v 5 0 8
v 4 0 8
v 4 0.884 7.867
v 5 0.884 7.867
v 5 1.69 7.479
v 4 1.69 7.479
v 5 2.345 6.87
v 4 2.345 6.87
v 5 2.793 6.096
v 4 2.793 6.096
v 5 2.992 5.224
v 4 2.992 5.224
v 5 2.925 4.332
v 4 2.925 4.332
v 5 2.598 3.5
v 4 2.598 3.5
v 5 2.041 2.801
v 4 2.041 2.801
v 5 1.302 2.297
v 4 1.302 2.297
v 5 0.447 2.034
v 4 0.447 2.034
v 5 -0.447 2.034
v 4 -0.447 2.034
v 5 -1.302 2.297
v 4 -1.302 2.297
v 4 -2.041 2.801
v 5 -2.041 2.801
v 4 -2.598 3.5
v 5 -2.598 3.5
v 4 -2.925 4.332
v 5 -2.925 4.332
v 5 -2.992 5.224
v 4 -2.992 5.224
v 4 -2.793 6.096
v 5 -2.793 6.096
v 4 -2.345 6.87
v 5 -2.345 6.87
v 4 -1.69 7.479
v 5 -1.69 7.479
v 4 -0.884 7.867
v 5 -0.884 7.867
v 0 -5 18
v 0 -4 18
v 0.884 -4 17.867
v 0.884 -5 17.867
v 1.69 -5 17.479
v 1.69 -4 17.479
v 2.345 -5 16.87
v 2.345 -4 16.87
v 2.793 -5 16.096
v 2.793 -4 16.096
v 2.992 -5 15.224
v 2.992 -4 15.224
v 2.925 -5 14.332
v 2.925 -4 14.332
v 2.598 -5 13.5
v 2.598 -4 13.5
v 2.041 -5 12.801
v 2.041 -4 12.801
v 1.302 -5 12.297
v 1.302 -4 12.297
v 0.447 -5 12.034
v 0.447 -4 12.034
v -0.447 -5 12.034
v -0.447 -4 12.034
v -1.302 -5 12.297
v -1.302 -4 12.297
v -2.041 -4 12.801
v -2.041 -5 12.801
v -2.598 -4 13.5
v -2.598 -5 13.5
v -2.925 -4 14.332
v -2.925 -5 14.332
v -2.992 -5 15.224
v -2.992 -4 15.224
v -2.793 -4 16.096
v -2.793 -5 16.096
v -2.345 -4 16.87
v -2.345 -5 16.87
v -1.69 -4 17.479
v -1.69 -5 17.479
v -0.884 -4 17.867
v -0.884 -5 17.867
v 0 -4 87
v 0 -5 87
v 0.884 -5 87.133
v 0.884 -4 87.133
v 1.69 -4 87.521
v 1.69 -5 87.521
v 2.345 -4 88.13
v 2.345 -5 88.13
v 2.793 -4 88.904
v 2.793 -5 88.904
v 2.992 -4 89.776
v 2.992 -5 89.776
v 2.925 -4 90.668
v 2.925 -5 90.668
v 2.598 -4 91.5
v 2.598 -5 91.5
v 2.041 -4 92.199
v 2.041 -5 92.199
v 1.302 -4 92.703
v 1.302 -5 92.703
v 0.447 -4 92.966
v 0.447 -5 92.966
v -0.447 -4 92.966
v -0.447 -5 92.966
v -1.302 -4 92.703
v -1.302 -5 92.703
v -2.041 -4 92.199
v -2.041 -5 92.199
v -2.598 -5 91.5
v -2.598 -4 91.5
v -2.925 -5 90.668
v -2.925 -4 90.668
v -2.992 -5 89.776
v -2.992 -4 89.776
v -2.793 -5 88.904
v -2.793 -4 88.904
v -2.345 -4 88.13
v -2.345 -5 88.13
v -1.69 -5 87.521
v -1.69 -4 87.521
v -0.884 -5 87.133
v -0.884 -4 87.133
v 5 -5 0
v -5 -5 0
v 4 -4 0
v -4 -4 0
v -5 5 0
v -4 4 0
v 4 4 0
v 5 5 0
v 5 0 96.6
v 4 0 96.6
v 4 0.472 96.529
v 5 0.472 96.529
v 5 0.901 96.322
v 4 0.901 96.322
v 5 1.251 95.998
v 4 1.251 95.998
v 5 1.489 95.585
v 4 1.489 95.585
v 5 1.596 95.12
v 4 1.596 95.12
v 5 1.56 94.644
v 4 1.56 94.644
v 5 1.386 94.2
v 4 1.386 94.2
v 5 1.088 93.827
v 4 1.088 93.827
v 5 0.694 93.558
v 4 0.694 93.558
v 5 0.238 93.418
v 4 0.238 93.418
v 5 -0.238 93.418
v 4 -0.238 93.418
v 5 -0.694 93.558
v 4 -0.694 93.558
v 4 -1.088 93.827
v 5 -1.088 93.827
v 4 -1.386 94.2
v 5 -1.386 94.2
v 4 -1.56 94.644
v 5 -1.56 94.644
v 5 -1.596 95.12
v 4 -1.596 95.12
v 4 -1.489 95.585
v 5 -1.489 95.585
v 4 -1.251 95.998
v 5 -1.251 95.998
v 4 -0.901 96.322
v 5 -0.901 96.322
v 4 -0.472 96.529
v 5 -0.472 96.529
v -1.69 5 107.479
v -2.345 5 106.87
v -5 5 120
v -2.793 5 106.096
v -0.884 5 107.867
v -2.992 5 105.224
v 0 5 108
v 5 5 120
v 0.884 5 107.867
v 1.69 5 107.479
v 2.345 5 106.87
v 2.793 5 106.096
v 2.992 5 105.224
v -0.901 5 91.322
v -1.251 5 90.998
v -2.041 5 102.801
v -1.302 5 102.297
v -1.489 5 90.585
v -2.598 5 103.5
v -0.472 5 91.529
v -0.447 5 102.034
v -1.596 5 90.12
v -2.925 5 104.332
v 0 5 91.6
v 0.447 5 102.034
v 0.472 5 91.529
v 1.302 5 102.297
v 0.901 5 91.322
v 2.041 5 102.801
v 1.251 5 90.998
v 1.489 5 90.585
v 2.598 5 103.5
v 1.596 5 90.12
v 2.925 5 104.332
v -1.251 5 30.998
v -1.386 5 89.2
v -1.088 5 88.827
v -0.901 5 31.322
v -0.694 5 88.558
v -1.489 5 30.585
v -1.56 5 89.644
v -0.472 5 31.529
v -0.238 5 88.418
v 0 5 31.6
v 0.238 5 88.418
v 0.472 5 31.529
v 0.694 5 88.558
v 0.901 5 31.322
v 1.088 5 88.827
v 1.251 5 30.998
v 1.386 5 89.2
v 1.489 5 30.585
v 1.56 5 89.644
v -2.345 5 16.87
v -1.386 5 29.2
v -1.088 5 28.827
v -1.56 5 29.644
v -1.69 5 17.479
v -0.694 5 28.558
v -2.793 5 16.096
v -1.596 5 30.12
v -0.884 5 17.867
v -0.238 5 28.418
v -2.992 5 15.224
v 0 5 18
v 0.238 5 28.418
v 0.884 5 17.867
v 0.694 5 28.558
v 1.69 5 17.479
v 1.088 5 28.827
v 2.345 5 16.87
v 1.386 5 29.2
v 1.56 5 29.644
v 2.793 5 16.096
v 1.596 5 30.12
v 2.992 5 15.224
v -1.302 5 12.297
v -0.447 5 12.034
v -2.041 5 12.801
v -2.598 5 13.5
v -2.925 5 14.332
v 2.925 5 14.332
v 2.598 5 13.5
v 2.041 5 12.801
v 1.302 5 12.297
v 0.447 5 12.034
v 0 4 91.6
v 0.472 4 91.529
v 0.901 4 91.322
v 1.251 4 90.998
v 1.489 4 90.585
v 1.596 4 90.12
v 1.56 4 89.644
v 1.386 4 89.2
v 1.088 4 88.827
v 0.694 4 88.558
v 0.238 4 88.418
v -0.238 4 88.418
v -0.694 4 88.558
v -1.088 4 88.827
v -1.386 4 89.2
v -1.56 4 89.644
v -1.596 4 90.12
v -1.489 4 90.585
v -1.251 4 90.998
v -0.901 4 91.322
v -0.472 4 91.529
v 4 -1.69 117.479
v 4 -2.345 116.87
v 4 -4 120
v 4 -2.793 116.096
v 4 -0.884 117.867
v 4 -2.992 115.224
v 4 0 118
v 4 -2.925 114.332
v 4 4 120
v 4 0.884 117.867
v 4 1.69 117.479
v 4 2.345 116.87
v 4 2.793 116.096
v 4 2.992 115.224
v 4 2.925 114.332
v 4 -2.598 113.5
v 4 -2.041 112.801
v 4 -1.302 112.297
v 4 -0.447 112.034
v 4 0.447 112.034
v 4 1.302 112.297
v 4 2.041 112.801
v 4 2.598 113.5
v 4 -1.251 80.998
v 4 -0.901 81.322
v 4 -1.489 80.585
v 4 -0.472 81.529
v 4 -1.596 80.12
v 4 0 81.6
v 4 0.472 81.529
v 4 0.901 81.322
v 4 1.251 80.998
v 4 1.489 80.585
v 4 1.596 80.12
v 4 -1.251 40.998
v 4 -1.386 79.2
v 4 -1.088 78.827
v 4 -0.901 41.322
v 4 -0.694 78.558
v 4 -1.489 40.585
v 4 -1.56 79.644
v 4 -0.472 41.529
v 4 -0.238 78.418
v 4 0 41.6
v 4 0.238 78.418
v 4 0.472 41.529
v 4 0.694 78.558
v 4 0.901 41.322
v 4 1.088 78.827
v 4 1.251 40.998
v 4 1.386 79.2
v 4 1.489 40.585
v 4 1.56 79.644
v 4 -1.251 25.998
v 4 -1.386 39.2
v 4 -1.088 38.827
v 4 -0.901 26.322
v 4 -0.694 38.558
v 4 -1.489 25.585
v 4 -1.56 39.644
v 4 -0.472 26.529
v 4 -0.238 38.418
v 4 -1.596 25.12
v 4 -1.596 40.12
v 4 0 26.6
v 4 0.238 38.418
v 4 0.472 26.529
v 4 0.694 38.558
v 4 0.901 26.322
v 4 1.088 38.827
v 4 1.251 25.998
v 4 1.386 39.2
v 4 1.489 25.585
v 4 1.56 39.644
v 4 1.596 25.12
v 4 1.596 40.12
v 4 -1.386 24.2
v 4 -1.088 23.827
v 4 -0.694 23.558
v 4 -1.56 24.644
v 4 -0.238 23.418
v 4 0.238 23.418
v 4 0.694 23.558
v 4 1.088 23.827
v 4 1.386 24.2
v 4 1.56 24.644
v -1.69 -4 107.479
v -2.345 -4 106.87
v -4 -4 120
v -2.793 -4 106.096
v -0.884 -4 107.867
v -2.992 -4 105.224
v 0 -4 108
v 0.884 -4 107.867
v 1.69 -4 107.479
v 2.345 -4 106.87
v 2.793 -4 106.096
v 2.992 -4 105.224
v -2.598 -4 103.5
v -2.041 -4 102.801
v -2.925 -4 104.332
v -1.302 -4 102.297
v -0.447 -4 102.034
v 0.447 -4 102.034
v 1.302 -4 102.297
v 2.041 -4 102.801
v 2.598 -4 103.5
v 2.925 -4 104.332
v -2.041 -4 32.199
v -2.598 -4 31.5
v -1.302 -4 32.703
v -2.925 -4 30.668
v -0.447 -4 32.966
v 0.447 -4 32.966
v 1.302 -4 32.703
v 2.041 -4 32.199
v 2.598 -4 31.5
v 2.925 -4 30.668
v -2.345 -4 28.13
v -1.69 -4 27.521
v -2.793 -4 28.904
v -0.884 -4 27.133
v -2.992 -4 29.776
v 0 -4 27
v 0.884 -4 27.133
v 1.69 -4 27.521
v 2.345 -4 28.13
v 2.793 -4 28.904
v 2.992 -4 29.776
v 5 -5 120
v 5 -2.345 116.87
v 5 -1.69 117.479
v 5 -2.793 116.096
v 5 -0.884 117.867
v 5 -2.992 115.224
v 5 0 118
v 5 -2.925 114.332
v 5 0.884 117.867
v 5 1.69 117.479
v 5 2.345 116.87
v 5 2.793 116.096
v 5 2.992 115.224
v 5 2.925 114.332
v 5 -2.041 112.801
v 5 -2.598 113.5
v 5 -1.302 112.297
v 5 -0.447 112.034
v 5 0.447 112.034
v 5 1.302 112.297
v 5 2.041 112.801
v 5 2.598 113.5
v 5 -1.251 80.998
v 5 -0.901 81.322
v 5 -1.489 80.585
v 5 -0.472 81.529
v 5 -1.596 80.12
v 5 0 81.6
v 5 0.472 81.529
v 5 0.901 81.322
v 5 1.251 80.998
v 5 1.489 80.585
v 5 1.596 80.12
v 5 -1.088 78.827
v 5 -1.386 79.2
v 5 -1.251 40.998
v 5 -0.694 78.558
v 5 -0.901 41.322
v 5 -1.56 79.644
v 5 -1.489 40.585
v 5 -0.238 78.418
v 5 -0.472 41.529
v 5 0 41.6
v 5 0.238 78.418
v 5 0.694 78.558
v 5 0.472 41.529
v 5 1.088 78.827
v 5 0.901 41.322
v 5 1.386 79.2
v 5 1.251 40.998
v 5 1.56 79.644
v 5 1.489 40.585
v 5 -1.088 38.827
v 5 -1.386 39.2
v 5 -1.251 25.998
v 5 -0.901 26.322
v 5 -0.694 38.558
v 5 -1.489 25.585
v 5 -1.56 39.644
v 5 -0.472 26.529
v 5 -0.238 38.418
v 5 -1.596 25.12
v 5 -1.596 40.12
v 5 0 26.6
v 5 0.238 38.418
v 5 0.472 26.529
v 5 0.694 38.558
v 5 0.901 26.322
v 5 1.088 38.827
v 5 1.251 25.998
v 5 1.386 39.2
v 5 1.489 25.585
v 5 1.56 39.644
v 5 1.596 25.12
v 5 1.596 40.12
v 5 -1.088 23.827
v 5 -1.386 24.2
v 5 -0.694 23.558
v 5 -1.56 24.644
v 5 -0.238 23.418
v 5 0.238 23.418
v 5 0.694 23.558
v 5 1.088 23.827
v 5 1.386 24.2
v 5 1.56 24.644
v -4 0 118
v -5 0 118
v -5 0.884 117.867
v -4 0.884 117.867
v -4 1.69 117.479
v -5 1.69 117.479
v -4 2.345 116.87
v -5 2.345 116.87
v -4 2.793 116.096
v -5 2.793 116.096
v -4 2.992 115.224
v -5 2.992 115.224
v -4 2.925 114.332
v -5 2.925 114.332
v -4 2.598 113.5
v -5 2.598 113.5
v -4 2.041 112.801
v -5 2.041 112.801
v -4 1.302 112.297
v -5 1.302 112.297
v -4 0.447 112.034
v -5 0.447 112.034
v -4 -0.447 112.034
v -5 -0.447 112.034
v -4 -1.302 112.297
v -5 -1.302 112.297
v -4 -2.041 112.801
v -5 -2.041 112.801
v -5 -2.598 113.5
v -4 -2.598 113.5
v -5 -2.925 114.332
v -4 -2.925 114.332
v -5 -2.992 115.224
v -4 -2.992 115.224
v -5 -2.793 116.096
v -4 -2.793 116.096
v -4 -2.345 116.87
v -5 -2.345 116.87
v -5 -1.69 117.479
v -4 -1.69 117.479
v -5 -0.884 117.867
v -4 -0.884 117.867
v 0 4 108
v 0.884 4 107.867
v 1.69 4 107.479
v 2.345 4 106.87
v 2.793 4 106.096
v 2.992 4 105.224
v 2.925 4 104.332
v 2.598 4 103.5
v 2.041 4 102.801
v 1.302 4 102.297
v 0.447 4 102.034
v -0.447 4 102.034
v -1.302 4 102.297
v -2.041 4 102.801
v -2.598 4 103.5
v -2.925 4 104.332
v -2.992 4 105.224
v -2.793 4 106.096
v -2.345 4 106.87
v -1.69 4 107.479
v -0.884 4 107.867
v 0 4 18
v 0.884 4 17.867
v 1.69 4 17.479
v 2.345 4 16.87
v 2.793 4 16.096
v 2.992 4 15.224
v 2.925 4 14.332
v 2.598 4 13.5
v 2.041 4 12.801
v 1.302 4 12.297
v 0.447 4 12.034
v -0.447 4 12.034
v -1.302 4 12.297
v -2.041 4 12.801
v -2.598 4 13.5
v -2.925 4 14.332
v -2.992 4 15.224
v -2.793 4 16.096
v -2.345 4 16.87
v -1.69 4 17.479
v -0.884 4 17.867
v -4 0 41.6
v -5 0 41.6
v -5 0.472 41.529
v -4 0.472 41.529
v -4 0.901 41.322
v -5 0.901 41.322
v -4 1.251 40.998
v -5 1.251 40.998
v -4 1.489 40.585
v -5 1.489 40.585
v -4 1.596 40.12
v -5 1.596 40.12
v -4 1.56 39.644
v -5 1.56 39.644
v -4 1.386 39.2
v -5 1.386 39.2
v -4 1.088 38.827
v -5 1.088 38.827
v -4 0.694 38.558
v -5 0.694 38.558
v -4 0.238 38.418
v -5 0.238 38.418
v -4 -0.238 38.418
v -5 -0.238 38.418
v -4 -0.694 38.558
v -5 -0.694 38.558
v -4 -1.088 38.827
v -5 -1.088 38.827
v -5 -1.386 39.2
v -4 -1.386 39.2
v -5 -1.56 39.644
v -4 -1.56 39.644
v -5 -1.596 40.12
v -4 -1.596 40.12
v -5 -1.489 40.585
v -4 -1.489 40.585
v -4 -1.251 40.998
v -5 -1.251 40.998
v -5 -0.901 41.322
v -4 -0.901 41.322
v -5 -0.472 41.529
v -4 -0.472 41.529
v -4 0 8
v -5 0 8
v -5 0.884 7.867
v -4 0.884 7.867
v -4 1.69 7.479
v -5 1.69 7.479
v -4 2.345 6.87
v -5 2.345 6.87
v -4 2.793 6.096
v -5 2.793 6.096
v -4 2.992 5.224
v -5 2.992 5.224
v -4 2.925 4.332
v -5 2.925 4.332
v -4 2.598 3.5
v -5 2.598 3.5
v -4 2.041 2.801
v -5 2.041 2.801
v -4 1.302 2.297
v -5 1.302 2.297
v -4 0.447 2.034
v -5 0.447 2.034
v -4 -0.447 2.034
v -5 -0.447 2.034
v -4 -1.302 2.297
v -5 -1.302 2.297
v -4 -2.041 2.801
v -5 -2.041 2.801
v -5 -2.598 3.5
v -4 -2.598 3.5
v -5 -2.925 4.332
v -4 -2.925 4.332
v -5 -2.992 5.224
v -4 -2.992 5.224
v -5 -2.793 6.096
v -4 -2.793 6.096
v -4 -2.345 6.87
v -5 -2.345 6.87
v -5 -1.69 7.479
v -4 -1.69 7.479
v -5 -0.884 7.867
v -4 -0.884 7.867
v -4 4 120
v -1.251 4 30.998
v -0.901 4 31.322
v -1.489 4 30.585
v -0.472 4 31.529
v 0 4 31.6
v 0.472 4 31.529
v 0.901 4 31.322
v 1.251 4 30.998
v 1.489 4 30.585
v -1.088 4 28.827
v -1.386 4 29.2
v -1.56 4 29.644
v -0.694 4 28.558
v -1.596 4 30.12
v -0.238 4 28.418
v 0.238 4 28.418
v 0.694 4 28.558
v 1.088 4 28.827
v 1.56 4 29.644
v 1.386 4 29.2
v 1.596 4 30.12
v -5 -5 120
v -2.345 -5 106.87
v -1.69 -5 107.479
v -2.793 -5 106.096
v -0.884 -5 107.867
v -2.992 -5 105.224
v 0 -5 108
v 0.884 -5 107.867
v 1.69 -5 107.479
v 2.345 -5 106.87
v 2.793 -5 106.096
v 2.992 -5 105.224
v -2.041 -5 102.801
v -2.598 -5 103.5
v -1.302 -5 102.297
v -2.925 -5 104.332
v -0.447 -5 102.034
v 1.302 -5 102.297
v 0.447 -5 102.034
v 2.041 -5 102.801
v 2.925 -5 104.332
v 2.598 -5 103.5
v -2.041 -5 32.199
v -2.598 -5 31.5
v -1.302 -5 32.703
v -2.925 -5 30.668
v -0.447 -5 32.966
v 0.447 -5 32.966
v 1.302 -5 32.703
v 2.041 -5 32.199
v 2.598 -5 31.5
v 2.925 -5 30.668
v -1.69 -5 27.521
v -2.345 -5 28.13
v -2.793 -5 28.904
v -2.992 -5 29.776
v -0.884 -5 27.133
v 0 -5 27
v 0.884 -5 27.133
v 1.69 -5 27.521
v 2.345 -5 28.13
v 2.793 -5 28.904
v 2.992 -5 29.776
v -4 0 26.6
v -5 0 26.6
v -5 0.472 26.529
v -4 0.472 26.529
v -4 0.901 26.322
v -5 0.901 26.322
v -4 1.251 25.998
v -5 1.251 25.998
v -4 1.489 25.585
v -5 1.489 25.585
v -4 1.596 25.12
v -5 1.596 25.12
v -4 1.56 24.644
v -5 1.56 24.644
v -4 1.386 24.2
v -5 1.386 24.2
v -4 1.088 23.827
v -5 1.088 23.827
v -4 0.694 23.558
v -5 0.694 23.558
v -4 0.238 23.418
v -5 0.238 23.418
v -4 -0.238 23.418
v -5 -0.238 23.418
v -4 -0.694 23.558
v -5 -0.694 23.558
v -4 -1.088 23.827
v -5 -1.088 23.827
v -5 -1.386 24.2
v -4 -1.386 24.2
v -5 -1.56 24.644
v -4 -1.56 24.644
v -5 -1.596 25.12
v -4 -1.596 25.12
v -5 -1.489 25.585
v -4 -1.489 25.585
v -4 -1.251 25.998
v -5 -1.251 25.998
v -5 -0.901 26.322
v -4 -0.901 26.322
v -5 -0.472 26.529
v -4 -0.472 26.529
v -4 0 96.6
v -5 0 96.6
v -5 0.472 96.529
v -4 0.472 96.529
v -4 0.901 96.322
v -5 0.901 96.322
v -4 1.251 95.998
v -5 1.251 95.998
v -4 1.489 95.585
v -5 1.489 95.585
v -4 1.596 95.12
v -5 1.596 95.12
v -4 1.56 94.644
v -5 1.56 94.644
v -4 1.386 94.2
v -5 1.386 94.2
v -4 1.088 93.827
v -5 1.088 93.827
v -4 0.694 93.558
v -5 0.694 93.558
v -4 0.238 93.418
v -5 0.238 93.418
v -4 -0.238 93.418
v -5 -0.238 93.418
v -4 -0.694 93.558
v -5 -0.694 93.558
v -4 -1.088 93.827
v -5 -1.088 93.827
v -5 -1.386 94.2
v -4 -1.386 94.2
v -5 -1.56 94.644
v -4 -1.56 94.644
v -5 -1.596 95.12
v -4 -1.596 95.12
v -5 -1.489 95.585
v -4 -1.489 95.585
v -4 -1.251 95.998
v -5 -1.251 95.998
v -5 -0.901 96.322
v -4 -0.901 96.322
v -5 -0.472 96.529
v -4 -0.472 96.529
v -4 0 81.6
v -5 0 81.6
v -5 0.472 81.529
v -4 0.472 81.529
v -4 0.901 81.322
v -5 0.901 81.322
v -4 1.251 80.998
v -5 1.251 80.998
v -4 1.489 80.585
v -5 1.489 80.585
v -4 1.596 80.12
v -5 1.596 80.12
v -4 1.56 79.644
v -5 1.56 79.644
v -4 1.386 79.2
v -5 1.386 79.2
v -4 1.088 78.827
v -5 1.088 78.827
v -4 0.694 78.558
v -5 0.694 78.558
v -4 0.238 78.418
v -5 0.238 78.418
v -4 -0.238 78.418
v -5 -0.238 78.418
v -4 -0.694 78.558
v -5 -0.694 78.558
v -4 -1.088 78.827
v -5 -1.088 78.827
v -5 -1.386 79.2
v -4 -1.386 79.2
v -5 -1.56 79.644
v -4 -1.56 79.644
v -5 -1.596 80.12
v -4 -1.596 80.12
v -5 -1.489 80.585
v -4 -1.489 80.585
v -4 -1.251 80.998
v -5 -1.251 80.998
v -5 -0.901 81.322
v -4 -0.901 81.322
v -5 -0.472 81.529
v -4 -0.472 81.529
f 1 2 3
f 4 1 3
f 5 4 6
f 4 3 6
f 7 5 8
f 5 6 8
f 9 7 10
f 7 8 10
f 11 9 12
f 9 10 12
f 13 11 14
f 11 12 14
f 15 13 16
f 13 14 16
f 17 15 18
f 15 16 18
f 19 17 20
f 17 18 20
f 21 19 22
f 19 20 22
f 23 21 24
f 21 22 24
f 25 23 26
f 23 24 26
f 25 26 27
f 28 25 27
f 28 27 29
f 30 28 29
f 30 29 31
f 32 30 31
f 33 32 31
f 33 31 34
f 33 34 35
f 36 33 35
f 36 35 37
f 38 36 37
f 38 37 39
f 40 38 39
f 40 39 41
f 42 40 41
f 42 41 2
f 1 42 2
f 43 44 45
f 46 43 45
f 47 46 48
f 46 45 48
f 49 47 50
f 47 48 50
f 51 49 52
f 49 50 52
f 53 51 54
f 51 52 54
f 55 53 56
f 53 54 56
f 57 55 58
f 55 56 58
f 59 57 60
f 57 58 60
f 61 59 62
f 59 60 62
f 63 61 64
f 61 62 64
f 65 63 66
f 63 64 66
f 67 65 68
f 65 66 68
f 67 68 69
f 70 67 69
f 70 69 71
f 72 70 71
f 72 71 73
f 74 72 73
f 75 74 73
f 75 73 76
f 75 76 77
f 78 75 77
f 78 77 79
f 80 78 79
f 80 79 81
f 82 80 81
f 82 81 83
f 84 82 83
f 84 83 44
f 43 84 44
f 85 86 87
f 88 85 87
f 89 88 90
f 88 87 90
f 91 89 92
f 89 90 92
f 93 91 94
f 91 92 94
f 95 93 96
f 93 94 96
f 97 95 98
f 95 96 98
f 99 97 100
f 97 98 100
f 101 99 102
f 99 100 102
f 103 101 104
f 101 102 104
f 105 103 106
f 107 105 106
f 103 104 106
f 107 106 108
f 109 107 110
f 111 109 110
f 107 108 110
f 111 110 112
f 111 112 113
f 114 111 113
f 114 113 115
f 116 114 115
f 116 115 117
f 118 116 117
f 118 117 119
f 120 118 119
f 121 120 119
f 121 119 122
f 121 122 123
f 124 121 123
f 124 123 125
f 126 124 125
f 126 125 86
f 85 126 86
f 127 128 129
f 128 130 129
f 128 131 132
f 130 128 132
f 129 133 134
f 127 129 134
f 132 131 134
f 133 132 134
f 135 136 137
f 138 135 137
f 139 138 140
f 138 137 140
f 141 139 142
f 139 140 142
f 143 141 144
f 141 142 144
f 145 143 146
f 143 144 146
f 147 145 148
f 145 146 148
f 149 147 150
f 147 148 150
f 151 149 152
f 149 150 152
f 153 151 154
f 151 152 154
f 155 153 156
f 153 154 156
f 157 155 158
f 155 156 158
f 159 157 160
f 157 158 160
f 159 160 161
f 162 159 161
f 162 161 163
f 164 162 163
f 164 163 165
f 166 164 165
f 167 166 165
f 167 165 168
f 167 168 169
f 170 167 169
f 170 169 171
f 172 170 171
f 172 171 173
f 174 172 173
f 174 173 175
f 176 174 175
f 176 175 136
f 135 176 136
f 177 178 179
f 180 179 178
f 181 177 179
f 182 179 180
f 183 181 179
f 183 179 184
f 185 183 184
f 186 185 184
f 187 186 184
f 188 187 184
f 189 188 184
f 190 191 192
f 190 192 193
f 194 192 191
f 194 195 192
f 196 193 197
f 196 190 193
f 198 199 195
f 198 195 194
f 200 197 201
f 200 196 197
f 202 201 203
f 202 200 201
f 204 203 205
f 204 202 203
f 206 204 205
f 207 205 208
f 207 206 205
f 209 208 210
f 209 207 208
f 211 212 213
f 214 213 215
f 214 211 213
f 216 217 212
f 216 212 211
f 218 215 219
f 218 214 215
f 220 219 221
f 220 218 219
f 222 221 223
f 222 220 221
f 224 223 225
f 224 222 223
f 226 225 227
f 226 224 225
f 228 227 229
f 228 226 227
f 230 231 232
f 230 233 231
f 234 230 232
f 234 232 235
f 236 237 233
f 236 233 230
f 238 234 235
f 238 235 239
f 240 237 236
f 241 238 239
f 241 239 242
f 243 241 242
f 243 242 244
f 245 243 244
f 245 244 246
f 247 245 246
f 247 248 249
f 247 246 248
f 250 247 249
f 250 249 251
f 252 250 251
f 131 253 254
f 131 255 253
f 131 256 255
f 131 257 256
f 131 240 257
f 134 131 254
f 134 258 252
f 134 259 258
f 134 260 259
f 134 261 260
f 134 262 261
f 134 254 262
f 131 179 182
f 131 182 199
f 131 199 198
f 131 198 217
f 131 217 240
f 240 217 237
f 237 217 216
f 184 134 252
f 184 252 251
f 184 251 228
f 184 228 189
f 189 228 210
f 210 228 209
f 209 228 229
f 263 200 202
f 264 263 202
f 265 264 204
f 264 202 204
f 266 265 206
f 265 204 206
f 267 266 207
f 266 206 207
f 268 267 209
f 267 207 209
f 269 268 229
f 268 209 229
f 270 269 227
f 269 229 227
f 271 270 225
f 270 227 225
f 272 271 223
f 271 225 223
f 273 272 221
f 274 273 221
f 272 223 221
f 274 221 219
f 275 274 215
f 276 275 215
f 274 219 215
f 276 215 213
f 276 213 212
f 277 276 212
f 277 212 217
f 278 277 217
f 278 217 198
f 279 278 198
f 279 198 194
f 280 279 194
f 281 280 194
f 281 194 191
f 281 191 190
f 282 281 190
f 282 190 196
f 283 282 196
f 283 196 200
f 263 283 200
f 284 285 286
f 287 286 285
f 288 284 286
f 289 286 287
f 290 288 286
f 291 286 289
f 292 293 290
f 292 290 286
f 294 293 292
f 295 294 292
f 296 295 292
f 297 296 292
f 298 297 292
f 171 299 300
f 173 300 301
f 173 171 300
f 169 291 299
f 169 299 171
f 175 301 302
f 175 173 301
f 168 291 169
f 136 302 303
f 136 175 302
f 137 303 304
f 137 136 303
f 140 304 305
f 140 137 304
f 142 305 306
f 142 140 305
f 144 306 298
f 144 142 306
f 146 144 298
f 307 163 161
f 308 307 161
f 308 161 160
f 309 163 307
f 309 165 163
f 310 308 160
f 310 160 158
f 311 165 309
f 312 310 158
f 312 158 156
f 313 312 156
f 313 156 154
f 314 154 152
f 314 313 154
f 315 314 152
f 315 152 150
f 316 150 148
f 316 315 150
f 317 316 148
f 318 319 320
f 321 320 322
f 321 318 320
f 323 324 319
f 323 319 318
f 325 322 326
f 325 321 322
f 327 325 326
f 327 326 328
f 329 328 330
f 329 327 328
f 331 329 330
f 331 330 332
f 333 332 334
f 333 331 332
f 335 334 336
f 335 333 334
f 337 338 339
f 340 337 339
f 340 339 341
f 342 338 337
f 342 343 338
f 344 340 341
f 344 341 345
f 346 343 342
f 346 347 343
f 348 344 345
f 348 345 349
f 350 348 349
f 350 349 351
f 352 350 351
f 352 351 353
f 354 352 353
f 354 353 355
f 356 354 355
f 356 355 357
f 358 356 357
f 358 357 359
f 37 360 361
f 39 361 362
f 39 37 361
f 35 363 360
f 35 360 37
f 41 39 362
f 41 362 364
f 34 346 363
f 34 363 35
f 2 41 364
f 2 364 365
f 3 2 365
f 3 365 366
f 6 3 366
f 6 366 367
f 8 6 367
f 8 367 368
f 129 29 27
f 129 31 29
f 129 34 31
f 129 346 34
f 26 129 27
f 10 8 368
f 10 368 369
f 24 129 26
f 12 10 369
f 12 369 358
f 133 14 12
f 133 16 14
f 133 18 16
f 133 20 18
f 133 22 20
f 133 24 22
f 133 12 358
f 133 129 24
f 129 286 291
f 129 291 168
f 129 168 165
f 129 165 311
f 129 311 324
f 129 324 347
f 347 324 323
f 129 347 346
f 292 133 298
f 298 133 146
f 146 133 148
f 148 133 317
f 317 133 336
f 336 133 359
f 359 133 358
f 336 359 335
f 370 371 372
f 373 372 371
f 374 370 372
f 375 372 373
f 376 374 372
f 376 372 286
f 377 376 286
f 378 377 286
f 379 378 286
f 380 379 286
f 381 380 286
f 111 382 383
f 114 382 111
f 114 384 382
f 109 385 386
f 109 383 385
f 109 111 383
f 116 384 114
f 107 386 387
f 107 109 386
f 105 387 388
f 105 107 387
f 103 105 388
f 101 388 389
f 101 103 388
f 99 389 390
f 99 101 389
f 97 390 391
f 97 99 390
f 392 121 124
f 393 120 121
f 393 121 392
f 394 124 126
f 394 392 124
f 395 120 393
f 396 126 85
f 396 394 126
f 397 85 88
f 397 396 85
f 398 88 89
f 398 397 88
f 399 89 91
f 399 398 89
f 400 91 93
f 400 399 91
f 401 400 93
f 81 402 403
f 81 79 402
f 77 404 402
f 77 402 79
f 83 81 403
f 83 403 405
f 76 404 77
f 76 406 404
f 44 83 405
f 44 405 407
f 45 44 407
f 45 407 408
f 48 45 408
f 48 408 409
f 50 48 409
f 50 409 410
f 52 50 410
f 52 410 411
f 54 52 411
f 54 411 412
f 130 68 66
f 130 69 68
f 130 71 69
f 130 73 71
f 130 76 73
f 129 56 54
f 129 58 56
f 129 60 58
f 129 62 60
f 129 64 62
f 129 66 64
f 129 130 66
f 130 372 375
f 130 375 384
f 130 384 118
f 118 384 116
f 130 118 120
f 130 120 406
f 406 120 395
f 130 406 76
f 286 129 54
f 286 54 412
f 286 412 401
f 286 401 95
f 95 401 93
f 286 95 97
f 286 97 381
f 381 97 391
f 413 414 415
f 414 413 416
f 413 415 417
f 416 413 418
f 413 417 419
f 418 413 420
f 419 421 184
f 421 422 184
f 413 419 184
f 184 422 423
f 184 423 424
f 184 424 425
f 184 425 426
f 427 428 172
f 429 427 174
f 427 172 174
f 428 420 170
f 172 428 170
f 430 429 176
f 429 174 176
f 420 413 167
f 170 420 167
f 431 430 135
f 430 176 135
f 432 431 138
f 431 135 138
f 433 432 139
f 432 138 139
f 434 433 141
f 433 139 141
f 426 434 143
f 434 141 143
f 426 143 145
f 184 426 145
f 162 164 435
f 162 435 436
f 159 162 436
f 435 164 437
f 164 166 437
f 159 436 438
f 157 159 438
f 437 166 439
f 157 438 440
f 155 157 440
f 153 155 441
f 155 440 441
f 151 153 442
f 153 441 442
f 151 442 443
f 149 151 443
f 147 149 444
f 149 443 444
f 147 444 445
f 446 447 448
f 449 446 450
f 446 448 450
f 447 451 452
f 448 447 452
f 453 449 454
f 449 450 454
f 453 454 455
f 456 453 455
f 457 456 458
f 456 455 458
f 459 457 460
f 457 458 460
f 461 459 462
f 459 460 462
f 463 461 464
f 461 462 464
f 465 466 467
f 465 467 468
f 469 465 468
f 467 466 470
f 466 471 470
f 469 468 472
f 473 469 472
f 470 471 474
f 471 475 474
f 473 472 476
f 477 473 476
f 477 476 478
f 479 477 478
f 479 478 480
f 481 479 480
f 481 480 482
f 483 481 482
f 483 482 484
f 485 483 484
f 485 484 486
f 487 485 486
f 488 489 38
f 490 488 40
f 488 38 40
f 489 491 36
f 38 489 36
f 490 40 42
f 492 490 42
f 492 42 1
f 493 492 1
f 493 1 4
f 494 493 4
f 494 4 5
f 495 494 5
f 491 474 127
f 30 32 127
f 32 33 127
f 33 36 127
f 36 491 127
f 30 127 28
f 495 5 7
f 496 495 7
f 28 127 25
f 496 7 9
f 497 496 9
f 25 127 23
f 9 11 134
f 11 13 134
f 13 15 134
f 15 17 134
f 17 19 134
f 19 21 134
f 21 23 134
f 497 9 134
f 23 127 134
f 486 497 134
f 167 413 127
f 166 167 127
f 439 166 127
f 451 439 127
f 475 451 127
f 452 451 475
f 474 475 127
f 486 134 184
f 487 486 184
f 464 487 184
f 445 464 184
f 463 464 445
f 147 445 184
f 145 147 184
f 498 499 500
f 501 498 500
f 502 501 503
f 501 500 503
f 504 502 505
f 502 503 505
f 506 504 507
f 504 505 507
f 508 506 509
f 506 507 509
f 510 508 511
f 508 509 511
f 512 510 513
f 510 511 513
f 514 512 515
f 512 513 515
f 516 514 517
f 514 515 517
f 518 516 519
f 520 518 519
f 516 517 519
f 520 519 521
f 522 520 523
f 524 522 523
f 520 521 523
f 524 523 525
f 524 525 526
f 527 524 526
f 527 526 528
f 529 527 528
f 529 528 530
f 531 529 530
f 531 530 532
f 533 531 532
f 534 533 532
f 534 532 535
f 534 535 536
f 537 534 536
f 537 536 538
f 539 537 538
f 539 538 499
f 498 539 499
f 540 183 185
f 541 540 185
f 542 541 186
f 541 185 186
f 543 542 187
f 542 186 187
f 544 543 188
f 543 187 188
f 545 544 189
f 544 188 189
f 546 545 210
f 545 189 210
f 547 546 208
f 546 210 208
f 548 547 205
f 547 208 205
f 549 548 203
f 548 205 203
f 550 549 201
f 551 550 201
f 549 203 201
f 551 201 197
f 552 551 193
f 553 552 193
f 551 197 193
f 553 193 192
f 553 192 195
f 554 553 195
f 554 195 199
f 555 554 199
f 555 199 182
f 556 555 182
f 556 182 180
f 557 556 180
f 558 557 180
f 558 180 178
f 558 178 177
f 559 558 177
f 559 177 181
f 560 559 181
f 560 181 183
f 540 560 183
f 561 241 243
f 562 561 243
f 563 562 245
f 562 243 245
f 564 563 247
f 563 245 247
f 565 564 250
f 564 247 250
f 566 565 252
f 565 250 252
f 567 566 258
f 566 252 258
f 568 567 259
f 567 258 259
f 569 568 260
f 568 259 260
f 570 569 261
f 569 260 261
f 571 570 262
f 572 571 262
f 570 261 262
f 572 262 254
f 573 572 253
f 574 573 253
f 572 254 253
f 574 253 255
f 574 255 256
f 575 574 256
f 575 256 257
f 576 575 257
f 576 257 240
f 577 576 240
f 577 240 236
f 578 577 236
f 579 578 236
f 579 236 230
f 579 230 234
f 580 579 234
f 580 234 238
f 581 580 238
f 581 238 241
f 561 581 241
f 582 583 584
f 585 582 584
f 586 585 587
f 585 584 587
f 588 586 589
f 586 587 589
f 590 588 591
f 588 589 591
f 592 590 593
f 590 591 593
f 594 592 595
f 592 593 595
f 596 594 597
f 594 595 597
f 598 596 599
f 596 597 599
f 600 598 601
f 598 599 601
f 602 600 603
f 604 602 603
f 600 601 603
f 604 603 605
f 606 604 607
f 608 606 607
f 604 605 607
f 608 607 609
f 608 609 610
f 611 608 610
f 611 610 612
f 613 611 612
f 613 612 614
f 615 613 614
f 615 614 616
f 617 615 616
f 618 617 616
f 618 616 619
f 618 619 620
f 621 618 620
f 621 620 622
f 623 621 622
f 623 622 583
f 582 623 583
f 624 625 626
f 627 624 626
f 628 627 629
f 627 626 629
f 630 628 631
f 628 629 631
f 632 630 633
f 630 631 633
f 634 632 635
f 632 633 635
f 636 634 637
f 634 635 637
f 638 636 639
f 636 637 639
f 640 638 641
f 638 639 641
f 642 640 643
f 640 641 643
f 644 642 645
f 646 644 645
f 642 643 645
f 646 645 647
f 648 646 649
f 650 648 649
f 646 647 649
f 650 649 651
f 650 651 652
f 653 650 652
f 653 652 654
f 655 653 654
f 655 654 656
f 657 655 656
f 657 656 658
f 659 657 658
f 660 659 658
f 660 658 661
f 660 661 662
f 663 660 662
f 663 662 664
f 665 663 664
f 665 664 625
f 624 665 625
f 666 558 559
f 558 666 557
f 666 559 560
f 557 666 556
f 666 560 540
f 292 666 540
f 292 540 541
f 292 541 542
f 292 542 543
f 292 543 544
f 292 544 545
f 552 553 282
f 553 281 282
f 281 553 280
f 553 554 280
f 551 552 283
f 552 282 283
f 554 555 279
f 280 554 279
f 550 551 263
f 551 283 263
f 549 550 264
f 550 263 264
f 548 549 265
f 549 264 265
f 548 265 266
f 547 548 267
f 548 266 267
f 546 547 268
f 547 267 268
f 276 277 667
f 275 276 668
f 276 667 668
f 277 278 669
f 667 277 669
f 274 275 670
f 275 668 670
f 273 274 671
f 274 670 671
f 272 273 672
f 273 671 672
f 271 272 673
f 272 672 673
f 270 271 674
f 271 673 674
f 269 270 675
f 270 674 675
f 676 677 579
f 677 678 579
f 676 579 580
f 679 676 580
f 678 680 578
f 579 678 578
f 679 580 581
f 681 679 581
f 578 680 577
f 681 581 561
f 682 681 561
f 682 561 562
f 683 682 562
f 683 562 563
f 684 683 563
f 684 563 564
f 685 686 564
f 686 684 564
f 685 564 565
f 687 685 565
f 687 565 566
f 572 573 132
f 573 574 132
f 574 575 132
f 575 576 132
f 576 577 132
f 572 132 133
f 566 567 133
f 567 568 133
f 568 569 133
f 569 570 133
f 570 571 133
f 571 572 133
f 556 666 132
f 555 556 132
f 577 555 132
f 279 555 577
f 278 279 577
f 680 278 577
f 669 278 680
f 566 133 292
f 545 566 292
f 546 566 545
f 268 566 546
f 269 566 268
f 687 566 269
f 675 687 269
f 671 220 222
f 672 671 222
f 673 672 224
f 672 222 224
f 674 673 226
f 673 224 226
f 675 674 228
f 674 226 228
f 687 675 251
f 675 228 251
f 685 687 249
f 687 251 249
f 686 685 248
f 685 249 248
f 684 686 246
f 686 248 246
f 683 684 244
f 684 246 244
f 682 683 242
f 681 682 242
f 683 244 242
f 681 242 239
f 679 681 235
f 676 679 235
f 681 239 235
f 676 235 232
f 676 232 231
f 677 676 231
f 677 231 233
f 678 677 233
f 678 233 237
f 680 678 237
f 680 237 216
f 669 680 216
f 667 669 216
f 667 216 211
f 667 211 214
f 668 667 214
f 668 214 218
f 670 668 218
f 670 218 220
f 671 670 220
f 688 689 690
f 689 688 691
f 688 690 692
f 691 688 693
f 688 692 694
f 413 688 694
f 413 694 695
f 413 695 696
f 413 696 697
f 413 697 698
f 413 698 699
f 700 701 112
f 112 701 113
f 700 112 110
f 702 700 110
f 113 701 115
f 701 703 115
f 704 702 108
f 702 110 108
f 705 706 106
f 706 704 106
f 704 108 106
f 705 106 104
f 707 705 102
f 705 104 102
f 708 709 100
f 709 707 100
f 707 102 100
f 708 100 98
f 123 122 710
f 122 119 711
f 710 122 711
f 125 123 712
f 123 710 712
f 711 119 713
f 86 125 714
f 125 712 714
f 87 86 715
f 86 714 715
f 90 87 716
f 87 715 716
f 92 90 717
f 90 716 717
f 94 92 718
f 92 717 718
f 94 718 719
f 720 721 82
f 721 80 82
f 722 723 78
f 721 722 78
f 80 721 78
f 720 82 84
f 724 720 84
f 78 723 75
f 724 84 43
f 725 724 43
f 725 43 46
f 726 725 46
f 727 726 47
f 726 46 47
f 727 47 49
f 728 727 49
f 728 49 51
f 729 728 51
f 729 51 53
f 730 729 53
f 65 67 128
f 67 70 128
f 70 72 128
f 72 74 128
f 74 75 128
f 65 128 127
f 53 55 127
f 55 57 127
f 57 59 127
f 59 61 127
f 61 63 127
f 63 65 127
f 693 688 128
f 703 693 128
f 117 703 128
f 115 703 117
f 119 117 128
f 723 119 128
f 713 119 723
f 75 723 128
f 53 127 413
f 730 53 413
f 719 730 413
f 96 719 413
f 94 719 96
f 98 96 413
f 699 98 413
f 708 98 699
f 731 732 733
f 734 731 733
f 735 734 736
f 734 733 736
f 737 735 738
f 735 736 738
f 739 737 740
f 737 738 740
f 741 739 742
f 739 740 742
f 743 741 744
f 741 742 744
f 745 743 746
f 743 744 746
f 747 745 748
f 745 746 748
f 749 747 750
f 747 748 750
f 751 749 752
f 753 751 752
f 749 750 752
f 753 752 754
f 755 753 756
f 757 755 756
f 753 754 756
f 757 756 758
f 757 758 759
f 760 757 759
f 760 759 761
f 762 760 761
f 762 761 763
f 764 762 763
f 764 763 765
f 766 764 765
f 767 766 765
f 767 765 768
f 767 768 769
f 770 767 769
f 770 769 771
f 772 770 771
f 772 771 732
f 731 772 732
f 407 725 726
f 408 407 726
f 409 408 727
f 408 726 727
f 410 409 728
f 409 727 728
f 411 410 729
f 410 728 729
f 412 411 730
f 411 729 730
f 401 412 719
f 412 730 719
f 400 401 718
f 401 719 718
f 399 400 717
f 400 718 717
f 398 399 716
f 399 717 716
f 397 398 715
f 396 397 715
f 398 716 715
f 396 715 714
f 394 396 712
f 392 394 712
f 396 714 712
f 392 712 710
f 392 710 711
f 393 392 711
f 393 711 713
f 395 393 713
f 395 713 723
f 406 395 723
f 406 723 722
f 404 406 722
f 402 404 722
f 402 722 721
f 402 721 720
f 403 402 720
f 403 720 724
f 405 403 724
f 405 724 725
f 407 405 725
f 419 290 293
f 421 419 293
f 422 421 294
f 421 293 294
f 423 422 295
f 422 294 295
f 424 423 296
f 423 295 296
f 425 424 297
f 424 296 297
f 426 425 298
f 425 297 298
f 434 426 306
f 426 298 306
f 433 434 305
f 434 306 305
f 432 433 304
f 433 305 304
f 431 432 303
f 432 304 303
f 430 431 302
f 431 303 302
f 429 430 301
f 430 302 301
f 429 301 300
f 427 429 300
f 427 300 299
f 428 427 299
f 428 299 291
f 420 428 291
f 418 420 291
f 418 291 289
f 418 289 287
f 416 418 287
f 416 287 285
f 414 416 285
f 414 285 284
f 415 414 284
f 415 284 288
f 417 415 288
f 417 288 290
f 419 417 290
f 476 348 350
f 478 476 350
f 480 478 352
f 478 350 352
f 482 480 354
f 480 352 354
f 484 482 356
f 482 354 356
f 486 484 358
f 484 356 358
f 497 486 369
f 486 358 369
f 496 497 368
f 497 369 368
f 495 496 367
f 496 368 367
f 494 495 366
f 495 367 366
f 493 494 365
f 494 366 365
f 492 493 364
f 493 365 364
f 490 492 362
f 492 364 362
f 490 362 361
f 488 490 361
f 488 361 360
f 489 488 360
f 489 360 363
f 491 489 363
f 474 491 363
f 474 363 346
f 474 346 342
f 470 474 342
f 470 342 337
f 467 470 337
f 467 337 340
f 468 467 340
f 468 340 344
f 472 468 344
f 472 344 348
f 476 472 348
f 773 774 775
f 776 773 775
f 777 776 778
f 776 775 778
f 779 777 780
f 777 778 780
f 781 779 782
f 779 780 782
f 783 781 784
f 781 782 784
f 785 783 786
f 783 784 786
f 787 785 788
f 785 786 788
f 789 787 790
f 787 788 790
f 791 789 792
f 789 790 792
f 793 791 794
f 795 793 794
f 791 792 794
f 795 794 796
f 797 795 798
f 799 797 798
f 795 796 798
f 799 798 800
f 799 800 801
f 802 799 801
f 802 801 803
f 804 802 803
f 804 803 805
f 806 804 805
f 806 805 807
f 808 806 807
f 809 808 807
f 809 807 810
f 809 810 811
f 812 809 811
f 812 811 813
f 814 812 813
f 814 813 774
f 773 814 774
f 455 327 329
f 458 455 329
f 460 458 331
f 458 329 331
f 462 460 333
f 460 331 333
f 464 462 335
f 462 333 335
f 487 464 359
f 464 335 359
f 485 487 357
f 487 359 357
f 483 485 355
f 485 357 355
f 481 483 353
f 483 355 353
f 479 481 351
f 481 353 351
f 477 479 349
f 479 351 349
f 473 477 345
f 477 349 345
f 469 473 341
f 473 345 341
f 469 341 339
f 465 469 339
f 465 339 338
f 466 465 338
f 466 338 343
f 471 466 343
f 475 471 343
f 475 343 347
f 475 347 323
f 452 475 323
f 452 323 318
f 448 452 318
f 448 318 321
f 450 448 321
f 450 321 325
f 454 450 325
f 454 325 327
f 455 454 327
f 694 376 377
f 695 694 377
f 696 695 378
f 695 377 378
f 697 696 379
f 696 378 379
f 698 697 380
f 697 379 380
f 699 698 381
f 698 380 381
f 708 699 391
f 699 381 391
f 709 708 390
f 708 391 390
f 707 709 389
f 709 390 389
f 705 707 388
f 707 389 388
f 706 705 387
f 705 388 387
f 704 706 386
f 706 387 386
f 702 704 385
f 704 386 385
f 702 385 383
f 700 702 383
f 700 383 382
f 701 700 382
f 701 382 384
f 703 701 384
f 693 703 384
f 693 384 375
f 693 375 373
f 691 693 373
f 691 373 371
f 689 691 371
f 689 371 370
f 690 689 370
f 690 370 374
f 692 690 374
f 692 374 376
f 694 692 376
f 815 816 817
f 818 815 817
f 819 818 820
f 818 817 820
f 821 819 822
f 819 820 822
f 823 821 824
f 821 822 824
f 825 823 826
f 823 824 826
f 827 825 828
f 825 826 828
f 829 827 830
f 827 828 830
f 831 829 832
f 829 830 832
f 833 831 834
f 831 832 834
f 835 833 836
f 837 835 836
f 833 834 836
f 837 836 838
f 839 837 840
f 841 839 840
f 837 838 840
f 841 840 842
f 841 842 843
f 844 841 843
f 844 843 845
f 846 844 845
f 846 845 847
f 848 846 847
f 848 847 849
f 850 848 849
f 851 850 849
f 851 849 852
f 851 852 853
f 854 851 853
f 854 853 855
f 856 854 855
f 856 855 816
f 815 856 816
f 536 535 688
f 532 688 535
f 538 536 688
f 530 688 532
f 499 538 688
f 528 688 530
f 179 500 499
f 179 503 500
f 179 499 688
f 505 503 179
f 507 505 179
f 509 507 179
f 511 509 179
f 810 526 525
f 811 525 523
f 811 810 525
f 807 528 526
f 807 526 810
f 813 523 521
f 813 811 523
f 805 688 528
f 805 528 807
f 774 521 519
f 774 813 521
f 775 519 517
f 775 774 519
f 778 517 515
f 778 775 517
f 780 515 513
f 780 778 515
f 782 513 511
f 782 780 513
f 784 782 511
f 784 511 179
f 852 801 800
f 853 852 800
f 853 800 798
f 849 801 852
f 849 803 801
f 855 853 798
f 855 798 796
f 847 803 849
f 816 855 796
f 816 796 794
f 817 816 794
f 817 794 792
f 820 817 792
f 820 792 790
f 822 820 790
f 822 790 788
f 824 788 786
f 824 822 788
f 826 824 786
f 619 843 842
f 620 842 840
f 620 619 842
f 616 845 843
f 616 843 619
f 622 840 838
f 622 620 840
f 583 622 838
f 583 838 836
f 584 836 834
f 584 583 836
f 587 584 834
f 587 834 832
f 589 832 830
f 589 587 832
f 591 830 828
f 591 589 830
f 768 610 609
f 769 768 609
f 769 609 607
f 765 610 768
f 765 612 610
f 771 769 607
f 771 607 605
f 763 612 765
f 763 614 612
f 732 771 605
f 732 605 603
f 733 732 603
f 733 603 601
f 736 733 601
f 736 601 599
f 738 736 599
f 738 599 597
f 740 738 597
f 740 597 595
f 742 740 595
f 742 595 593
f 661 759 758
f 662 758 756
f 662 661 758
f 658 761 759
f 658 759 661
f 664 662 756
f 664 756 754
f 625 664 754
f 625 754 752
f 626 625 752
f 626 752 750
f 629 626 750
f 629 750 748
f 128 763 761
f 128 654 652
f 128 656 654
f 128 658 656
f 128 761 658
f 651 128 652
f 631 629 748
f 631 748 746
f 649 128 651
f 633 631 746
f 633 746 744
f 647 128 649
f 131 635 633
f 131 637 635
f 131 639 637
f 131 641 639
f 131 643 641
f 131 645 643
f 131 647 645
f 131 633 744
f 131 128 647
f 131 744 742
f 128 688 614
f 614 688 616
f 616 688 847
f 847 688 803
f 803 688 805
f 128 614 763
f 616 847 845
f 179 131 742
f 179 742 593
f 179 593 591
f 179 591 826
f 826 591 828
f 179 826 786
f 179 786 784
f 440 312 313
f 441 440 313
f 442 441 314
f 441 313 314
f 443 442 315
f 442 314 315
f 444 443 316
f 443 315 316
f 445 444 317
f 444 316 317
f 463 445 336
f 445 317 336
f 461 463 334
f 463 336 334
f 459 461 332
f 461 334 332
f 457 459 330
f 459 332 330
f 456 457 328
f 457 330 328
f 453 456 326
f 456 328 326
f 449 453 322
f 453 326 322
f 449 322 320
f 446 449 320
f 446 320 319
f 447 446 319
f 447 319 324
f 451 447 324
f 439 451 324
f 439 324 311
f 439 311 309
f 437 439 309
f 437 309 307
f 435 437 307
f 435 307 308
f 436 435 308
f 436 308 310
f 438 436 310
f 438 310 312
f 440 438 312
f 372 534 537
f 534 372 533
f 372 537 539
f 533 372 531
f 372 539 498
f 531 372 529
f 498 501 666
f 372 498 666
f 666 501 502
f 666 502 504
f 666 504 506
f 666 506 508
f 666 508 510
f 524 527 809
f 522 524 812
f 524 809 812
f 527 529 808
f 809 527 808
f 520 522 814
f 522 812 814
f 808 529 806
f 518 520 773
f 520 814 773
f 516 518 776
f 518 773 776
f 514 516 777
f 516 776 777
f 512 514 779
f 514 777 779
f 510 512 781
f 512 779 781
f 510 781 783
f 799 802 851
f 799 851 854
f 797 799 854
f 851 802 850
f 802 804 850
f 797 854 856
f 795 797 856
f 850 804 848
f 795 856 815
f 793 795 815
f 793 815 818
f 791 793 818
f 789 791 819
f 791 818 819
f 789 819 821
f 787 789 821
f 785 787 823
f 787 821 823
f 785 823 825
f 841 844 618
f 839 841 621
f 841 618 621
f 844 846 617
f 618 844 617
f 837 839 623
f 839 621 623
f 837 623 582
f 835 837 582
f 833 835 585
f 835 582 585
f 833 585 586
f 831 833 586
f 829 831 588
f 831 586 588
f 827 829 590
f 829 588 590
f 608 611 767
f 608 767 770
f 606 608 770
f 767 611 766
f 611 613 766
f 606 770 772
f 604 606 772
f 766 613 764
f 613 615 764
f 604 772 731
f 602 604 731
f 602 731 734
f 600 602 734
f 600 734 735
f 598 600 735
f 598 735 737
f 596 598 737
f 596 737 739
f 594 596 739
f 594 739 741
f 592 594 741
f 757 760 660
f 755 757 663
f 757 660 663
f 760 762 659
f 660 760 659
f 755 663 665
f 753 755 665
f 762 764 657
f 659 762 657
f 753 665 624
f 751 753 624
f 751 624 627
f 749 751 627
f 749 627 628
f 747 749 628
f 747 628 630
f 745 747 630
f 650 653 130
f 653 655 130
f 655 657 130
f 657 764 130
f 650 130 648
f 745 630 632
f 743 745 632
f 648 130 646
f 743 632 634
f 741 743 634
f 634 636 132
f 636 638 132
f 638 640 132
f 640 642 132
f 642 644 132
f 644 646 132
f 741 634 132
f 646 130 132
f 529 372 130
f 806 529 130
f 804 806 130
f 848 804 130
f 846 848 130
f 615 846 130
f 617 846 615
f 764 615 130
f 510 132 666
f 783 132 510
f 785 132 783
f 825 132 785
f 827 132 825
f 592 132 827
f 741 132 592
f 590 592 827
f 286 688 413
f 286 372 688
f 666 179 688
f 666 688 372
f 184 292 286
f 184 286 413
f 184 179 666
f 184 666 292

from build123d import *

# Parameters (mm, degrees)
SKETCH_1_W          = 10
SKETCH_1_H          = 10
SKETCH_1_W_2        = 8
SKETCH_1_H_2        = 8
EXTRUDE_1_DEPTH     = 120
SKETCH_2_R          = 3
CUT_EXTRUDE_1_DEPTH = 121.519707932
SKETCH_3_R          = 3
CUT_EXTRUDE_2_DEPTH = 10
SKETCH_4_R          = 1.6
CUT_EXTRUDE_3_DEPTH = 10
SKETCH_5_R          = 1.6
CUT_EXTRUDE_4_DEPTH = 121.519707932
SKETCH_6_R          = 3
CUT_EXTRUDE_5_DEPTH = 2
SKETCH_7_R          = 1.6
CUT_EXTRUDE_6_DEPTH = 121.519707932


with BuildPart() as part:
    # ｽｹｯﾁ1 → ﾎﾞｽ - 押し出し1 (new body)
    with BuildSketch(Plane.XY):
        Rectangle(SKETCH_1_W, SKETCH_1_H)
        Rectangle(SKETCH_1_W_2, SKETCH_1_H_2, mode=Mode.SUBTRACT)
    extrude(amount=EXTRUDE_1_DEPTH)

    # ｽｹｯﾁ2 → ｶｯﾄ - 押し出し1 (cut, through all)
    with BuildSketch(Plane.ZY.offset(5)):
        with Locations((5, 0)):
            Circle(SKETCH_2_R)
        with Locations((115, 0)):
            Circle(SKETCH_2_R)
    extrude(amount=-CUT_EXTRUDE_1_DEPTH, mode=Mode.SUBTRACT)

    # ｽｹｯﾁ3 → ｶｯﾄ - 押し出し2 (cut)
    with BuildSketch(Plane(origin=(0, 5, 0), x_dir=(1, 0, 0), z_dir=(0, 1, 0))):
        with Locations(Location((0, -105, 0), (0, 0, 270))):
            Circle(SKETCH_3_R)
        with Locations(Location((0, -15, 0), (0, 0, 270))):
            Circle(SKETCH_3_R)
    extrude(amount=-CUT_EXTRUDE_2_DEPTH, mode=Mode.SUBTRACT)

    # ｽｹｯﾁ4 → ｶｯﾄ - 押し出し3 (cut)
    with BuildSketch(Plane(origin=(0, 5, 0), x_dir=(1, 0, 0), z_dir=(0, 1, 0))):
        with Locations(Location((0, -30, 0), (0, 0, 270))):
            Circle(SKETCH_4_R)
        with Locations(Location((0, -90, 0), (0, 0, 270))):
            Circle(SKETCH_4_R)
    extrude(amount=-CUT_EXTRUDE_3_DEPTH, mode=Mode.SUBTRACT)

    # ｽｹｯﾁ5 → ｶｯﾄ - 押し出し4 (cut, through all)
    with BuildSketch(Plane.ZY.offset(5)):
        with Locations((25, 0)):
            Circle(SKETCH_5_R)
        with Locations((95, 0)):
            Circle(SKETCH_5_R)
    extrude(amount=-CUT_EXTRUDE_4_DEPTH, mode=Mode.SUBTRACT)

    # ｽｹｯﾁ6 → ｶｯﾄ - 押し出し5 (cut)
    with BuildSketch(Plane(origin=(0, -5, 0), x_dir=(-1, 0, 0), z_dir=(0, -1, 0))):
        with Locations(Location((0, -30, 0), (0, 0, 90))):
            Circle(SKETCH_6_R)
        with Locations(Location((0, -90, 0), (0, 0, 90))):
            Circle(SKETCH_6_R)
    extrude(amount=-CUT_EXTRUDE_5_DEPTH, mode=Mode.SUBTRACT)

    # ｽｹｯﾁ7 → ｶｯﾄ - 押し出し6 (cut, through all)
    with BuildSketch(Plane.ZY.offset(5)):
        with Locations((80, 0)):
            Circle(SKETCH_7_R)
        with Locations((40, 0)):
            Circle(SKETCH_7_R)
    extrude(amount=-CUT_EXTRUDE_6_DEPTH, mode=Mode.SUBTRACT)


solid = part.part
